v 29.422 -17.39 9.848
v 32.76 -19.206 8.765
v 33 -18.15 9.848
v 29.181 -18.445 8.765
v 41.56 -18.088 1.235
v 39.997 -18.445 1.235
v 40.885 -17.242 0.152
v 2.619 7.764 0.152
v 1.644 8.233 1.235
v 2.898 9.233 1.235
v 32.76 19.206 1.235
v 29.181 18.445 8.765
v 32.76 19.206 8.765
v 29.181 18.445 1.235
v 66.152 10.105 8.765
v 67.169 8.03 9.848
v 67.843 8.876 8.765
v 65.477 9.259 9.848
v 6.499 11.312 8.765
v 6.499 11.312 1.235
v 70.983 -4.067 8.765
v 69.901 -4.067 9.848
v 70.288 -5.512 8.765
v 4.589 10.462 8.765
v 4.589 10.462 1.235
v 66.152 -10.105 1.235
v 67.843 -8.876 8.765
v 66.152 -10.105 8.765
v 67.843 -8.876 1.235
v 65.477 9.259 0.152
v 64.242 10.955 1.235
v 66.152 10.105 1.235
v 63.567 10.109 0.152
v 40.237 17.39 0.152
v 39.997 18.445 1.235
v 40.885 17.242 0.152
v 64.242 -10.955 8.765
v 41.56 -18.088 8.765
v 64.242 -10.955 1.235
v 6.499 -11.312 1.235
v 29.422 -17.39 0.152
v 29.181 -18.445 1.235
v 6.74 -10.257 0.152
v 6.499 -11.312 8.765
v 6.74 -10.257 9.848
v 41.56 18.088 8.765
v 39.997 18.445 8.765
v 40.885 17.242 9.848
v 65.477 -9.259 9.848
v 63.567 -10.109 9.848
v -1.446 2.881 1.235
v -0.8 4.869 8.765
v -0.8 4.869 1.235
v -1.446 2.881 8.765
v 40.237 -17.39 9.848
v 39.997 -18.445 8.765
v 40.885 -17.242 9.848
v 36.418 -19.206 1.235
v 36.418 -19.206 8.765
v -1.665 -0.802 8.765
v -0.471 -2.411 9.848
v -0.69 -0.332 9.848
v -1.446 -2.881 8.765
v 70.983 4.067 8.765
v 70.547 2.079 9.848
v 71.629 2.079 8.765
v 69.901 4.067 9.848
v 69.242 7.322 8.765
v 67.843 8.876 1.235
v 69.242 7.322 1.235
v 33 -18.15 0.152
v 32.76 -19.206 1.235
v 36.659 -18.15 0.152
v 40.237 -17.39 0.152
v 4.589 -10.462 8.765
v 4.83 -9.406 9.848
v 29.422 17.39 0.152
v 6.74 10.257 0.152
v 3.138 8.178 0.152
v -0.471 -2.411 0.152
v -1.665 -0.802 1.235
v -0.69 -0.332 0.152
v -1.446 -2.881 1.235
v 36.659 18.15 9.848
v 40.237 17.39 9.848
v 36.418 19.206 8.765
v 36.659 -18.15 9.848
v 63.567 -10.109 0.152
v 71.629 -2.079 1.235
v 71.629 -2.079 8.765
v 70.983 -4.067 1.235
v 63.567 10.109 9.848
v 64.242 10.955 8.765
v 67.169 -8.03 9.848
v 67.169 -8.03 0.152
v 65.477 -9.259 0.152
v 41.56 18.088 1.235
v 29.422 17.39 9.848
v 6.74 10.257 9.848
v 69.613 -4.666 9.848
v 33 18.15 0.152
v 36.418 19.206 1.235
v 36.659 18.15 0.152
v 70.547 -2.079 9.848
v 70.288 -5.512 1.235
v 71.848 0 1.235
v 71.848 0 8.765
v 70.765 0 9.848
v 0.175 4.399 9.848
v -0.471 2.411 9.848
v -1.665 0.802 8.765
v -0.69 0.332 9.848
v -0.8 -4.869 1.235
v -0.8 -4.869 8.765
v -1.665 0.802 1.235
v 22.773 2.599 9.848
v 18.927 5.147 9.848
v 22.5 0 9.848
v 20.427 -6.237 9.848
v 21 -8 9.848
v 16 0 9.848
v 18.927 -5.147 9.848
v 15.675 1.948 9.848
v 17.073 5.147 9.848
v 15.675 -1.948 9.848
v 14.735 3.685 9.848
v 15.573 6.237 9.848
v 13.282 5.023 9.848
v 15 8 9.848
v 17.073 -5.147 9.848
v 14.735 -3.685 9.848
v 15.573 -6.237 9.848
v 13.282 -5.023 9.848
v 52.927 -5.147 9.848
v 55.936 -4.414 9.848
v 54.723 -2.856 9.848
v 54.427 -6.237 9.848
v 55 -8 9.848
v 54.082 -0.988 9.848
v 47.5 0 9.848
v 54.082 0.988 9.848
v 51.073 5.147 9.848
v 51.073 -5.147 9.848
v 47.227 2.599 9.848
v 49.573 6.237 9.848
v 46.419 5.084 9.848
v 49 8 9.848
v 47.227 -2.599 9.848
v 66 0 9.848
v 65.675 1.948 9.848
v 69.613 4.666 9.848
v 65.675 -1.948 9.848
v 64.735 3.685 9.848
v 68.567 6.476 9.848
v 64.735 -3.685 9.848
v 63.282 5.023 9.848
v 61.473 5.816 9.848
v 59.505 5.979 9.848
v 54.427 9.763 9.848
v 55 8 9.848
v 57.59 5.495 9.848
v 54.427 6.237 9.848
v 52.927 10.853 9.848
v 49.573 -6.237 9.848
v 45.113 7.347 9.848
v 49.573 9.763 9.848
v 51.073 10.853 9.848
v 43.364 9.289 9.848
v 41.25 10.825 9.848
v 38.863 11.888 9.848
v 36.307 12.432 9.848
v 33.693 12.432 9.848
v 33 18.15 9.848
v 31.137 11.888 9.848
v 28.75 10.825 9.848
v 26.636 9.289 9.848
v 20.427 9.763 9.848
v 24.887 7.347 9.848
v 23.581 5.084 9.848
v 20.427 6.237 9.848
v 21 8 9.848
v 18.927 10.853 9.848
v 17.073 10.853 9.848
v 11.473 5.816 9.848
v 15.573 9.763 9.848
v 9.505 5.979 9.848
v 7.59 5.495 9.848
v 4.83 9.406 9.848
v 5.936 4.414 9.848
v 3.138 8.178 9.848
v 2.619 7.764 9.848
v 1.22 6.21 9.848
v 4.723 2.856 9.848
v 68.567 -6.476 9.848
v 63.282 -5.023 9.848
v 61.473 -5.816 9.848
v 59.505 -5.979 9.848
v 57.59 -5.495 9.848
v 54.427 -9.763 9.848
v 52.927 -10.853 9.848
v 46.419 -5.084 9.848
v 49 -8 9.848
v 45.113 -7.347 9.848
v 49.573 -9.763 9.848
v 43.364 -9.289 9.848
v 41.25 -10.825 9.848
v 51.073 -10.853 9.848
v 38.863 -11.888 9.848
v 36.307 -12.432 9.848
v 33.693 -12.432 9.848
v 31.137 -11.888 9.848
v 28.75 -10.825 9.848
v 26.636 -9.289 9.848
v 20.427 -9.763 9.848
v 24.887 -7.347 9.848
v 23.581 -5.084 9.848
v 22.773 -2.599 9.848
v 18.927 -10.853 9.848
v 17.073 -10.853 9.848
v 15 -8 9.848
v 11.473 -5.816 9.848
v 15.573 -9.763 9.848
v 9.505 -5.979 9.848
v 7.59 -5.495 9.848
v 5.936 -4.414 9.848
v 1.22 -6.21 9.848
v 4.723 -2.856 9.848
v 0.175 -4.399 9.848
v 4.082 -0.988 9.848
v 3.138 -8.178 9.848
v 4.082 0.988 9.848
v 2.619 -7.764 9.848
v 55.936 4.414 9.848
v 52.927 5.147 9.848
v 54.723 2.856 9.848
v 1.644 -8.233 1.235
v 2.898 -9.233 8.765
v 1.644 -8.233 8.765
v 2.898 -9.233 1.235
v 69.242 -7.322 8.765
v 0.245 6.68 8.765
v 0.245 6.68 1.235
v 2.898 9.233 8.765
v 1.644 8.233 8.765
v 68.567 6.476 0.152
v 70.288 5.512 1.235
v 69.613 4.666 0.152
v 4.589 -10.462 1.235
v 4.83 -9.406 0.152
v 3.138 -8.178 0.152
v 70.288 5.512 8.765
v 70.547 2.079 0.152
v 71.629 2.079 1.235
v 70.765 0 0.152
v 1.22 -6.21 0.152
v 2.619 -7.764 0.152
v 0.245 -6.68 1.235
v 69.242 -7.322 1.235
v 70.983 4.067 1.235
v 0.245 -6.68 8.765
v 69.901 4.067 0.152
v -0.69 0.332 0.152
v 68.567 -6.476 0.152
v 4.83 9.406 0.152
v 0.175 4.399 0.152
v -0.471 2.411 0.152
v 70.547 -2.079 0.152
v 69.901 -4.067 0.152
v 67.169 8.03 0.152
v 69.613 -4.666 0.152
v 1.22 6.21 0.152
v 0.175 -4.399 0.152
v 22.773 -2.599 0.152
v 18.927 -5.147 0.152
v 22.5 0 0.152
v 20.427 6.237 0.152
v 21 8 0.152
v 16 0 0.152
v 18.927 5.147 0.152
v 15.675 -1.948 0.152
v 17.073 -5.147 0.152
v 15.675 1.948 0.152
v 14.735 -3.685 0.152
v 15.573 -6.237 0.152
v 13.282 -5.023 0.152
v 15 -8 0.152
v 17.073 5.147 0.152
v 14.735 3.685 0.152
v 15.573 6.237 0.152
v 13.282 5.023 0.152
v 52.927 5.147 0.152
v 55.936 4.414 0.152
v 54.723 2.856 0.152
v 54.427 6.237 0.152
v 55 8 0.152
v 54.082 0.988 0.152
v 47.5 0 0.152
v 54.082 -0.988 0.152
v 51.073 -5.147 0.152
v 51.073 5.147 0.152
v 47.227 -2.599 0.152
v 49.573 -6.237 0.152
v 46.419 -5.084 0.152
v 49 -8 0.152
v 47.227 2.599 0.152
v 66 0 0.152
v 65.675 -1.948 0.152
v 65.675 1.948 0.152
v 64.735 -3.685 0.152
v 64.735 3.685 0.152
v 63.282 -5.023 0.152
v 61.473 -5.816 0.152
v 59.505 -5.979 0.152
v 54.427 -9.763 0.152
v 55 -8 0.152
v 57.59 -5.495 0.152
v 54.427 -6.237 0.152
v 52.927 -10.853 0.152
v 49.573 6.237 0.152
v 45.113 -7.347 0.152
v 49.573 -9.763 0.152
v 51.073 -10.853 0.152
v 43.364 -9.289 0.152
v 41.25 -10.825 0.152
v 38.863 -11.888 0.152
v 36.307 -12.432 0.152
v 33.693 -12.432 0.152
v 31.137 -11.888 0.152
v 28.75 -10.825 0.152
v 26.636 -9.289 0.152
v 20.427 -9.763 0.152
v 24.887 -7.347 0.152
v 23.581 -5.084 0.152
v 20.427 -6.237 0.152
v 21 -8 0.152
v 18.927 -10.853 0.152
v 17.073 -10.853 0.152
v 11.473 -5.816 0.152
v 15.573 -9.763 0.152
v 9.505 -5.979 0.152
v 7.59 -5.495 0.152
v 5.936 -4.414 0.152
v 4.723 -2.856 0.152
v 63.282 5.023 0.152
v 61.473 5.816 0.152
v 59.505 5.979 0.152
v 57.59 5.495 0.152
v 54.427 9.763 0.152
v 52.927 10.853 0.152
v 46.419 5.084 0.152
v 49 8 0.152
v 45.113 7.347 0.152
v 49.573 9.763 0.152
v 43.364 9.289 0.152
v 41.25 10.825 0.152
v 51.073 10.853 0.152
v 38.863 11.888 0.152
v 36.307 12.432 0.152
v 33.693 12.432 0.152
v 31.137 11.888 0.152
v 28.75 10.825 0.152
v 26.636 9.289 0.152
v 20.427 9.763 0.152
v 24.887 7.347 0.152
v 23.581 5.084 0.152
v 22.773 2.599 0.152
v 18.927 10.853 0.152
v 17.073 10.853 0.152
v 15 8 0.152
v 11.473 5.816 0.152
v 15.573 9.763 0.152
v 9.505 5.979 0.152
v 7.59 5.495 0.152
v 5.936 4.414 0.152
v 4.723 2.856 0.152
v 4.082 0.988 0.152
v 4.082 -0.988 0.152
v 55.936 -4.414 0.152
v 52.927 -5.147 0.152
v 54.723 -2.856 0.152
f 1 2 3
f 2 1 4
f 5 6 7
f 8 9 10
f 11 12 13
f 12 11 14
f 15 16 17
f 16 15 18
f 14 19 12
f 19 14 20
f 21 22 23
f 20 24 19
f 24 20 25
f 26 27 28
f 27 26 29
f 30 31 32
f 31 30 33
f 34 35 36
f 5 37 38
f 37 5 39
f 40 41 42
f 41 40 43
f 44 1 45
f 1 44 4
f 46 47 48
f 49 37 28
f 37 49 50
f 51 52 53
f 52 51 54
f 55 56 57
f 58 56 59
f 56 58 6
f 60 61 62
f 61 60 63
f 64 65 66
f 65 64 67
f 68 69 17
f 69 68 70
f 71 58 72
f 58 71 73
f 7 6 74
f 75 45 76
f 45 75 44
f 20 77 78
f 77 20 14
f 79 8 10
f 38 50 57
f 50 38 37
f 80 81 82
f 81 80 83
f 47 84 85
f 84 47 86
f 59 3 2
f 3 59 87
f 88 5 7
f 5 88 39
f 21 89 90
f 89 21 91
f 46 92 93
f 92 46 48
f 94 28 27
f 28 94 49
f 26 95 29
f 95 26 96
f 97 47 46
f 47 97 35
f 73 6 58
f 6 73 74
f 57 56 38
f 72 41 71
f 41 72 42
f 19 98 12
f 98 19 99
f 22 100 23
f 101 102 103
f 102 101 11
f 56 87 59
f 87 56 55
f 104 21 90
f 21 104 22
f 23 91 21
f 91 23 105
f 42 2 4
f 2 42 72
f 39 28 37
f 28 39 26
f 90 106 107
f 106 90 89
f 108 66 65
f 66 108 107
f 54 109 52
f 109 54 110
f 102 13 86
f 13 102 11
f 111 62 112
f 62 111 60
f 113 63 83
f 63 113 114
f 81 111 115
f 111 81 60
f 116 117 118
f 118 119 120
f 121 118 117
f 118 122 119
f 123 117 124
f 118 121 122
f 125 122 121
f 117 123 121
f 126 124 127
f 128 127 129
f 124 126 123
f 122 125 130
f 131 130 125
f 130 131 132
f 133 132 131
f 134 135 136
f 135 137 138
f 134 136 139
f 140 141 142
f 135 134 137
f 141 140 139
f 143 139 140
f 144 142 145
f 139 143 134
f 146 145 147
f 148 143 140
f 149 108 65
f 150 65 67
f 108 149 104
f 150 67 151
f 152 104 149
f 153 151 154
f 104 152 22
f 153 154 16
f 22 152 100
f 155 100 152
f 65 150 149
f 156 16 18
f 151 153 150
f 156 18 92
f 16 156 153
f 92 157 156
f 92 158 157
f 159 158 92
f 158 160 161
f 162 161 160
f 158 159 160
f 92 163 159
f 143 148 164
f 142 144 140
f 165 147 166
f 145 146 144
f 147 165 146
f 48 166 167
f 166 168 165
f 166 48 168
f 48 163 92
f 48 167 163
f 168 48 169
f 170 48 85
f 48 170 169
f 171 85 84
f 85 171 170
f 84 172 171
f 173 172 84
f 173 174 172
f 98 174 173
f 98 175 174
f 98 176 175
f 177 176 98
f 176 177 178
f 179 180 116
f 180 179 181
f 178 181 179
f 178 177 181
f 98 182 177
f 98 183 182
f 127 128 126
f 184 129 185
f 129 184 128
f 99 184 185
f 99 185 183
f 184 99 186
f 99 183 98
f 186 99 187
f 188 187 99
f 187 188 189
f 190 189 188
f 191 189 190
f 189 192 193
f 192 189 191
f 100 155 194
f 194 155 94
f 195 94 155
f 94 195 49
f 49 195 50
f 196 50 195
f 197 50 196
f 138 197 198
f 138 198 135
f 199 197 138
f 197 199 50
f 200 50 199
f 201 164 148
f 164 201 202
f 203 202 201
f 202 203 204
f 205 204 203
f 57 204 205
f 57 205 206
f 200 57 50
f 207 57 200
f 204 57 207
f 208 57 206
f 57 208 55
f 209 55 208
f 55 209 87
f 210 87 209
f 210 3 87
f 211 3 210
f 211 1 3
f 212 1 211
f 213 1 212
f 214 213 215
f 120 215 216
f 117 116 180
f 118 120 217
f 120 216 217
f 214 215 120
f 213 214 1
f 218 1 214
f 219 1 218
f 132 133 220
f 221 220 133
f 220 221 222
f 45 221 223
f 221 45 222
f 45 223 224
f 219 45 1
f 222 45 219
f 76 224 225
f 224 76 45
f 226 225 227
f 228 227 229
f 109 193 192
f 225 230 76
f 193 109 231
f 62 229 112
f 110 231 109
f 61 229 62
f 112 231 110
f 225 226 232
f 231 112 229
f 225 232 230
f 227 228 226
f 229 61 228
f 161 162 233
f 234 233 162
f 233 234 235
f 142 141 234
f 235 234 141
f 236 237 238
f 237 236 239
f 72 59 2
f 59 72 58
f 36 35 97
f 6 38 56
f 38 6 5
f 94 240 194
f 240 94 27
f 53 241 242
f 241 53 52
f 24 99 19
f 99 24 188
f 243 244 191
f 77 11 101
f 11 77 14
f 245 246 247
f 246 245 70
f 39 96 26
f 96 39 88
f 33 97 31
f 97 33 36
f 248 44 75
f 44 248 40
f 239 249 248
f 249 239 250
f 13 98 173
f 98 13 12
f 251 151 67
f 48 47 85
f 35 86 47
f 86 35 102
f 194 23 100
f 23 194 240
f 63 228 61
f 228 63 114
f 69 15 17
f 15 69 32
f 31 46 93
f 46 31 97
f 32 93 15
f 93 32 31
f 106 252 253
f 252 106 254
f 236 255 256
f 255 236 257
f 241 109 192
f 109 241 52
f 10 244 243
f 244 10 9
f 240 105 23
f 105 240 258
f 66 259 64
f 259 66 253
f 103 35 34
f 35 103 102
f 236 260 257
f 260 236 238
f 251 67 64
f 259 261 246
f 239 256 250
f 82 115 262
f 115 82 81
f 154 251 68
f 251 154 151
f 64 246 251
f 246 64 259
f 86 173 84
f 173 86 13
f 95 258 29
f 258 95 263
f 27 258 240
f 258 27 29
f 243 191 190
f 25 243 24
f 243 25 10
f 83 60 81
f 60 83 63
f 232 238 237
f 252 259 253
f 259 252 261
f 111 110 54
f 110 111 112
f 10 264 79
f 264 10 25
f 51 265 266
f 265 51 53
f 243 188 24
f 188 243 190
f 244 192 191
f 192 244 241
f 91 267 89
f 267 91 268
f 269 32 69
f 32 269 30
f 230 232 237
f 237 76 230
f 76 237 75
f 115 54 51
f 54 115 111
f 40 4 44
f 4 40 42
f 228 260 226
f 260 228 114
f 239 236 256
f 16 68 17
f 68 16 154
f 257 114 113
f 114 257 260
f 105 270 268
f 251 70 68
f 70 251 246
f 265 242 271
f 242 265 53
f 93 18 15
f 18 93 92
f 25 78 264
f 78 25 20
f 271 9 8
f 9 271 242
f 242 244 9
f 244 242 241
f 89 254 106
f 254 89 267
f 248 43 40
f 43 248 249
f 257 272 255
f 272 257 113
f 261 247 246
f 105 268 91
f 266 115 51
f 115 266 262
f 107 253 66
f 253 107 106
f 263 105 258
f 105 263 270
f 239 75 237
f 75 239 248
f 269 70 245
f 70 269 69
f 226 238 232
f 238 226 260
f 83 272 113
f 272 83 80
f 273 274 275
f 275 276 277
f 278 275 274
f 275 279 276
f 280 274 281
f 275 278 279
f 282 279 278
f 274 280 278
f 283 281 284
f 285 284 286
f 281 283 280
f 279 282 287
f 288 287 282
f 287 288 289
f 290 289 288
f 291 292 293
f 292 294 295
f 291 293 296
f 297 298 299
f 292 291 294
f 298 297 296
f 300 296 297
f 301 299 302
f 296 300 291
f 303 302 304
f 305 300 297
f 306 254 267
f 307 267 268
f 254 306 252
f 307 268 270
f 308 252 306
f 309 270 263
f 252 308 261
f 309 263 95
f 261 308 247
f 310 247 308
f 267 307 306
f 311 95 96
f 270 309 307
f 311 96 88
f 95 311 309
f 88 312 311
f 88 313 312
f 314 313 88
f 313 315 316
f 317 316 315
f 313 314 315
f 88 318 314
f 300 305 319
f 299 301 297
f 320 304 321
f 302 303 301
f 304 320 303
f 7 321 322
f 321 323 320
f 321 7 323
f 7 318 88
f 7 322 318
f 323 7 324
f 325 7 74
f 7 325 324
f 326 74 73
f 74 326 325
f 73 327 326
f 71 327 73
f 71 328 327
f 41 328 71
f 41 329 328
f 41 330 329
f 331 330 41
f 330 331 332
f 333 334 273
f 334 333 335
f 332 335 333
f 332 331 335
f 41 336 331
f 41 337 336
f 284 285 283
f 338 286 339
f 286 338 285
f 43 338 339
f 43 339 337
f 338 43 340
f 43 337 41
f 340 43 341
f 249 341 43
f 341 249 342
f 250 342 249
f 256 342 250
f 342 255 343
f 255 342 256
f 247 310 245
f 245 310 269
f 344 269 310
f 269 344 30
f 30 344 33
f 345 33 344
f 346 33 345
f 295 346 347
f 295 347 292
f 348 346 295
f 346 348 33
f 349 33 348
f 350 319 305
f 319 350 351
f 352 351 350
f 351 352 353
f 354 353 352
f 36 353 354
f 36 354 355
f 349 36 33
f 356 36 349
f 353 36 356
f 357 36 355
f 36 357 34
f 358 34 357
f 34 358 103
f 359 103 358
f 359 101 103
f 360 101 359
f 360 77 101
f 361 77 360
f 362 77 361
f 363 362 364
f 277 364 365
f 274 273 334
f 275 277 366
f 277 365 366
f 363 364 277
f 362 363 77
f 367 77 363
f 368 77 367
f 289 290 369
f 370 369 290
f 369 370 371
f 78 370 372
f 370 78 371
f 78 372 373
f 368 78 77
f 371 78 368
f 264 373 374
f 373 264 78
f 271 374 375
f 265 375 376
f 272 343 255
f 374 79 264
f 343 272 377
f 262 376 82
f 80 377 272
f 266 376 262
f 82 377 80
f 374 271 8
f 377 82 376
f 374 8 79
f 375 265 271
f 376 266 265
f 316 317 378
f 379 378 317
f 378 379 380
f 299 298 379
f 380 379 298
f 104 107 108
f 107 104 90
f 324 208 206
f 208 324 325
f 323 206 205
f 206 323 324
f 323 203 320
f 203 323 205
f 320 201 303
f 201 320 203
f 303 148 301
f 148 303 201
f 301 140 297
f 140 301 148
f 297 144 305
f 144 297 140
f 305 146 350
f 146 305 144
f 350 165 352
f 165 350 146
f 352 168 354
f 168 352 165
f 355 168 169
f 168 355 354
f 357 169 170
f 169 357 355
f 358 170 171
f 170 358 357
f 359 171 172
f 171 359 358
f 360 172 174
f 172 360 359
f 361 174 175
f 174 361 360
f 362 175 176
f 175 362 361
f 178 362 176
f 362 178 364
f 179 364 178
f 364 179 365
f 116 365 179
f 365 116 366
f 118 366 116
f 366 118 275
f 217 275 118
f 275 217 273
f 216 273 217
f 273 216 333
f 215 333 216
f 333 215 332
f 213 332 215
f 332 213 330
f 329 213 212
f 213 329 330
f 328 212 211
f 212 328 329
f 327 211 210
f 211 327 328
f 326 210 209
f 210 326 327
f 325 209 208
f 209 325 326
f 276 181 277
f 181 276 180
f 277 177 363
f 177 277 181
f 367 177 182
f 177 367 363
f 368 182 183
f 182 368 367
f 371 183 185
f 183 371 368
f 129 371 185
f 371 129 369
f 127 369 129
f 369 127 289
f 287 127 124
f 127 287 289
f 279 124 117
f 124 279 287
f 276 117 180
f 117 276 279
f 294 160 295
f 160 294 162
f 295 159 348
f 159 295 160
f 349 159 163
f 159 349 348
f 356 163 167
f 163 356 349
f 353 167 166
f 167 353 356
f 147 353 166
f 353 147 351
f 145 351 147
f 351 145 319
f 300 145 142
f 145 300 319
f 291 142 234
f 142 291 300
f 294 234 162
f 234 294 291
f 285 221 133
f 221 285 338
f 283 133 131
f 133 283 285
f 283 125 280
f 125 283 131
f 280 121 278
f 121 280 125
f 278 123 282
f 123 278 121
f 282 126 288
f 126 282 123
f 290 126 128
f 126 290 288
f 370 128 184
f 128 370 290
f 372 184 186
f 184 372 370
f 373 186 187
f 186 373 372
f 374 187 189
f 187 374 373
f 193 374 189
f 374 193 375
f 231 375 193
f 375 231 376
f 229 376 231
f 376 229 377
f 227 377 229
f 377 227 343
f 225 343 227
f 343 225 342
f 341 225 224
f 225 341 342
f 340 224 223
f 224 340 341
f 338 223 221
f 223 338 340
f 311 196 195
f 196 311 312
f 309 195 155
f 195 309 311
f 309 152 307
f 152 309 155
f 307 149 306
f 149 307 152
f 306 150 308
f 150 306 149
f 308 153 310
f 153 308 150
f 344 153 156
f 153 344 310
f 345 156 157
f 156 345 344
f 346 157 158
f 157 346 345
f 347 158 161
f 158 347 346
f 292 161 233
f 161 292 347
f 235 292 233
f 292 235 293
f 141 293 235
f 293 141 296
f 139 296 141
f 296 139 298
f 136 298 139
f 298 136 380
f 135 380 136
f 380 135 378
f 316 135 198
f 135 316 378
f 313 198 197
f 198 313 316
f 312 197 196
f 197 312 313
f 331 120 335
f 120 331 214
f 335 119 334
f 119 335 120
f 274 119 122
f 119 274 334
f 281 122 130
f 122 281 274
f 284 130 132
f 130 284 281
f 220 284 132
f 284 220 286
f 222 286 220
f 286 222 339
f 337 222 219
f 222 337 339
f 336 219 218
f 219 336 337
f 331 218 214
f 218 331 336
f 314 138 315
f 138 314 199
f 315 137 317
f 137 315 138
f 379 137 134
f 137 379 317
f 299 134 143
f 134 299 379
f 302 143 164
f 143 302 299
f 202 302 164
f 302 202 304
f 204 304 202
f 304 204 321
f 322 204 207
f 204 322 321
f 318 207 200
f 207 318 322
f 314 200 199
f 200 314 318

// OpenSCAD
difference() {
    translate([0, 0, 2])
    minkowski() {
        linear_extrude(6) 
            hull() {
                translate([10, 0])
                    circle(d = 20);

                translate([70/2, 0])
                    circle(d = 35);

                translate([70-10, 0])
                    circle(d = 20);
            }

        sphere(2);
    }

    linear_extrude(10) { 
        translate([10, 0])
            circle(d = 12);

        translate([70/2, 0])
            circle(d = 25);

        translate([70-10, 0])
            circle(d = 12);
        
        translate([18, 8])
            circle(d = 6);
        translate([18, -8])
            circle(d = 6);
        
        translate([70-18, 8])
            circle(d = 6);
        translate([70-18, -8])
            circle(d = 6);
    }
}
